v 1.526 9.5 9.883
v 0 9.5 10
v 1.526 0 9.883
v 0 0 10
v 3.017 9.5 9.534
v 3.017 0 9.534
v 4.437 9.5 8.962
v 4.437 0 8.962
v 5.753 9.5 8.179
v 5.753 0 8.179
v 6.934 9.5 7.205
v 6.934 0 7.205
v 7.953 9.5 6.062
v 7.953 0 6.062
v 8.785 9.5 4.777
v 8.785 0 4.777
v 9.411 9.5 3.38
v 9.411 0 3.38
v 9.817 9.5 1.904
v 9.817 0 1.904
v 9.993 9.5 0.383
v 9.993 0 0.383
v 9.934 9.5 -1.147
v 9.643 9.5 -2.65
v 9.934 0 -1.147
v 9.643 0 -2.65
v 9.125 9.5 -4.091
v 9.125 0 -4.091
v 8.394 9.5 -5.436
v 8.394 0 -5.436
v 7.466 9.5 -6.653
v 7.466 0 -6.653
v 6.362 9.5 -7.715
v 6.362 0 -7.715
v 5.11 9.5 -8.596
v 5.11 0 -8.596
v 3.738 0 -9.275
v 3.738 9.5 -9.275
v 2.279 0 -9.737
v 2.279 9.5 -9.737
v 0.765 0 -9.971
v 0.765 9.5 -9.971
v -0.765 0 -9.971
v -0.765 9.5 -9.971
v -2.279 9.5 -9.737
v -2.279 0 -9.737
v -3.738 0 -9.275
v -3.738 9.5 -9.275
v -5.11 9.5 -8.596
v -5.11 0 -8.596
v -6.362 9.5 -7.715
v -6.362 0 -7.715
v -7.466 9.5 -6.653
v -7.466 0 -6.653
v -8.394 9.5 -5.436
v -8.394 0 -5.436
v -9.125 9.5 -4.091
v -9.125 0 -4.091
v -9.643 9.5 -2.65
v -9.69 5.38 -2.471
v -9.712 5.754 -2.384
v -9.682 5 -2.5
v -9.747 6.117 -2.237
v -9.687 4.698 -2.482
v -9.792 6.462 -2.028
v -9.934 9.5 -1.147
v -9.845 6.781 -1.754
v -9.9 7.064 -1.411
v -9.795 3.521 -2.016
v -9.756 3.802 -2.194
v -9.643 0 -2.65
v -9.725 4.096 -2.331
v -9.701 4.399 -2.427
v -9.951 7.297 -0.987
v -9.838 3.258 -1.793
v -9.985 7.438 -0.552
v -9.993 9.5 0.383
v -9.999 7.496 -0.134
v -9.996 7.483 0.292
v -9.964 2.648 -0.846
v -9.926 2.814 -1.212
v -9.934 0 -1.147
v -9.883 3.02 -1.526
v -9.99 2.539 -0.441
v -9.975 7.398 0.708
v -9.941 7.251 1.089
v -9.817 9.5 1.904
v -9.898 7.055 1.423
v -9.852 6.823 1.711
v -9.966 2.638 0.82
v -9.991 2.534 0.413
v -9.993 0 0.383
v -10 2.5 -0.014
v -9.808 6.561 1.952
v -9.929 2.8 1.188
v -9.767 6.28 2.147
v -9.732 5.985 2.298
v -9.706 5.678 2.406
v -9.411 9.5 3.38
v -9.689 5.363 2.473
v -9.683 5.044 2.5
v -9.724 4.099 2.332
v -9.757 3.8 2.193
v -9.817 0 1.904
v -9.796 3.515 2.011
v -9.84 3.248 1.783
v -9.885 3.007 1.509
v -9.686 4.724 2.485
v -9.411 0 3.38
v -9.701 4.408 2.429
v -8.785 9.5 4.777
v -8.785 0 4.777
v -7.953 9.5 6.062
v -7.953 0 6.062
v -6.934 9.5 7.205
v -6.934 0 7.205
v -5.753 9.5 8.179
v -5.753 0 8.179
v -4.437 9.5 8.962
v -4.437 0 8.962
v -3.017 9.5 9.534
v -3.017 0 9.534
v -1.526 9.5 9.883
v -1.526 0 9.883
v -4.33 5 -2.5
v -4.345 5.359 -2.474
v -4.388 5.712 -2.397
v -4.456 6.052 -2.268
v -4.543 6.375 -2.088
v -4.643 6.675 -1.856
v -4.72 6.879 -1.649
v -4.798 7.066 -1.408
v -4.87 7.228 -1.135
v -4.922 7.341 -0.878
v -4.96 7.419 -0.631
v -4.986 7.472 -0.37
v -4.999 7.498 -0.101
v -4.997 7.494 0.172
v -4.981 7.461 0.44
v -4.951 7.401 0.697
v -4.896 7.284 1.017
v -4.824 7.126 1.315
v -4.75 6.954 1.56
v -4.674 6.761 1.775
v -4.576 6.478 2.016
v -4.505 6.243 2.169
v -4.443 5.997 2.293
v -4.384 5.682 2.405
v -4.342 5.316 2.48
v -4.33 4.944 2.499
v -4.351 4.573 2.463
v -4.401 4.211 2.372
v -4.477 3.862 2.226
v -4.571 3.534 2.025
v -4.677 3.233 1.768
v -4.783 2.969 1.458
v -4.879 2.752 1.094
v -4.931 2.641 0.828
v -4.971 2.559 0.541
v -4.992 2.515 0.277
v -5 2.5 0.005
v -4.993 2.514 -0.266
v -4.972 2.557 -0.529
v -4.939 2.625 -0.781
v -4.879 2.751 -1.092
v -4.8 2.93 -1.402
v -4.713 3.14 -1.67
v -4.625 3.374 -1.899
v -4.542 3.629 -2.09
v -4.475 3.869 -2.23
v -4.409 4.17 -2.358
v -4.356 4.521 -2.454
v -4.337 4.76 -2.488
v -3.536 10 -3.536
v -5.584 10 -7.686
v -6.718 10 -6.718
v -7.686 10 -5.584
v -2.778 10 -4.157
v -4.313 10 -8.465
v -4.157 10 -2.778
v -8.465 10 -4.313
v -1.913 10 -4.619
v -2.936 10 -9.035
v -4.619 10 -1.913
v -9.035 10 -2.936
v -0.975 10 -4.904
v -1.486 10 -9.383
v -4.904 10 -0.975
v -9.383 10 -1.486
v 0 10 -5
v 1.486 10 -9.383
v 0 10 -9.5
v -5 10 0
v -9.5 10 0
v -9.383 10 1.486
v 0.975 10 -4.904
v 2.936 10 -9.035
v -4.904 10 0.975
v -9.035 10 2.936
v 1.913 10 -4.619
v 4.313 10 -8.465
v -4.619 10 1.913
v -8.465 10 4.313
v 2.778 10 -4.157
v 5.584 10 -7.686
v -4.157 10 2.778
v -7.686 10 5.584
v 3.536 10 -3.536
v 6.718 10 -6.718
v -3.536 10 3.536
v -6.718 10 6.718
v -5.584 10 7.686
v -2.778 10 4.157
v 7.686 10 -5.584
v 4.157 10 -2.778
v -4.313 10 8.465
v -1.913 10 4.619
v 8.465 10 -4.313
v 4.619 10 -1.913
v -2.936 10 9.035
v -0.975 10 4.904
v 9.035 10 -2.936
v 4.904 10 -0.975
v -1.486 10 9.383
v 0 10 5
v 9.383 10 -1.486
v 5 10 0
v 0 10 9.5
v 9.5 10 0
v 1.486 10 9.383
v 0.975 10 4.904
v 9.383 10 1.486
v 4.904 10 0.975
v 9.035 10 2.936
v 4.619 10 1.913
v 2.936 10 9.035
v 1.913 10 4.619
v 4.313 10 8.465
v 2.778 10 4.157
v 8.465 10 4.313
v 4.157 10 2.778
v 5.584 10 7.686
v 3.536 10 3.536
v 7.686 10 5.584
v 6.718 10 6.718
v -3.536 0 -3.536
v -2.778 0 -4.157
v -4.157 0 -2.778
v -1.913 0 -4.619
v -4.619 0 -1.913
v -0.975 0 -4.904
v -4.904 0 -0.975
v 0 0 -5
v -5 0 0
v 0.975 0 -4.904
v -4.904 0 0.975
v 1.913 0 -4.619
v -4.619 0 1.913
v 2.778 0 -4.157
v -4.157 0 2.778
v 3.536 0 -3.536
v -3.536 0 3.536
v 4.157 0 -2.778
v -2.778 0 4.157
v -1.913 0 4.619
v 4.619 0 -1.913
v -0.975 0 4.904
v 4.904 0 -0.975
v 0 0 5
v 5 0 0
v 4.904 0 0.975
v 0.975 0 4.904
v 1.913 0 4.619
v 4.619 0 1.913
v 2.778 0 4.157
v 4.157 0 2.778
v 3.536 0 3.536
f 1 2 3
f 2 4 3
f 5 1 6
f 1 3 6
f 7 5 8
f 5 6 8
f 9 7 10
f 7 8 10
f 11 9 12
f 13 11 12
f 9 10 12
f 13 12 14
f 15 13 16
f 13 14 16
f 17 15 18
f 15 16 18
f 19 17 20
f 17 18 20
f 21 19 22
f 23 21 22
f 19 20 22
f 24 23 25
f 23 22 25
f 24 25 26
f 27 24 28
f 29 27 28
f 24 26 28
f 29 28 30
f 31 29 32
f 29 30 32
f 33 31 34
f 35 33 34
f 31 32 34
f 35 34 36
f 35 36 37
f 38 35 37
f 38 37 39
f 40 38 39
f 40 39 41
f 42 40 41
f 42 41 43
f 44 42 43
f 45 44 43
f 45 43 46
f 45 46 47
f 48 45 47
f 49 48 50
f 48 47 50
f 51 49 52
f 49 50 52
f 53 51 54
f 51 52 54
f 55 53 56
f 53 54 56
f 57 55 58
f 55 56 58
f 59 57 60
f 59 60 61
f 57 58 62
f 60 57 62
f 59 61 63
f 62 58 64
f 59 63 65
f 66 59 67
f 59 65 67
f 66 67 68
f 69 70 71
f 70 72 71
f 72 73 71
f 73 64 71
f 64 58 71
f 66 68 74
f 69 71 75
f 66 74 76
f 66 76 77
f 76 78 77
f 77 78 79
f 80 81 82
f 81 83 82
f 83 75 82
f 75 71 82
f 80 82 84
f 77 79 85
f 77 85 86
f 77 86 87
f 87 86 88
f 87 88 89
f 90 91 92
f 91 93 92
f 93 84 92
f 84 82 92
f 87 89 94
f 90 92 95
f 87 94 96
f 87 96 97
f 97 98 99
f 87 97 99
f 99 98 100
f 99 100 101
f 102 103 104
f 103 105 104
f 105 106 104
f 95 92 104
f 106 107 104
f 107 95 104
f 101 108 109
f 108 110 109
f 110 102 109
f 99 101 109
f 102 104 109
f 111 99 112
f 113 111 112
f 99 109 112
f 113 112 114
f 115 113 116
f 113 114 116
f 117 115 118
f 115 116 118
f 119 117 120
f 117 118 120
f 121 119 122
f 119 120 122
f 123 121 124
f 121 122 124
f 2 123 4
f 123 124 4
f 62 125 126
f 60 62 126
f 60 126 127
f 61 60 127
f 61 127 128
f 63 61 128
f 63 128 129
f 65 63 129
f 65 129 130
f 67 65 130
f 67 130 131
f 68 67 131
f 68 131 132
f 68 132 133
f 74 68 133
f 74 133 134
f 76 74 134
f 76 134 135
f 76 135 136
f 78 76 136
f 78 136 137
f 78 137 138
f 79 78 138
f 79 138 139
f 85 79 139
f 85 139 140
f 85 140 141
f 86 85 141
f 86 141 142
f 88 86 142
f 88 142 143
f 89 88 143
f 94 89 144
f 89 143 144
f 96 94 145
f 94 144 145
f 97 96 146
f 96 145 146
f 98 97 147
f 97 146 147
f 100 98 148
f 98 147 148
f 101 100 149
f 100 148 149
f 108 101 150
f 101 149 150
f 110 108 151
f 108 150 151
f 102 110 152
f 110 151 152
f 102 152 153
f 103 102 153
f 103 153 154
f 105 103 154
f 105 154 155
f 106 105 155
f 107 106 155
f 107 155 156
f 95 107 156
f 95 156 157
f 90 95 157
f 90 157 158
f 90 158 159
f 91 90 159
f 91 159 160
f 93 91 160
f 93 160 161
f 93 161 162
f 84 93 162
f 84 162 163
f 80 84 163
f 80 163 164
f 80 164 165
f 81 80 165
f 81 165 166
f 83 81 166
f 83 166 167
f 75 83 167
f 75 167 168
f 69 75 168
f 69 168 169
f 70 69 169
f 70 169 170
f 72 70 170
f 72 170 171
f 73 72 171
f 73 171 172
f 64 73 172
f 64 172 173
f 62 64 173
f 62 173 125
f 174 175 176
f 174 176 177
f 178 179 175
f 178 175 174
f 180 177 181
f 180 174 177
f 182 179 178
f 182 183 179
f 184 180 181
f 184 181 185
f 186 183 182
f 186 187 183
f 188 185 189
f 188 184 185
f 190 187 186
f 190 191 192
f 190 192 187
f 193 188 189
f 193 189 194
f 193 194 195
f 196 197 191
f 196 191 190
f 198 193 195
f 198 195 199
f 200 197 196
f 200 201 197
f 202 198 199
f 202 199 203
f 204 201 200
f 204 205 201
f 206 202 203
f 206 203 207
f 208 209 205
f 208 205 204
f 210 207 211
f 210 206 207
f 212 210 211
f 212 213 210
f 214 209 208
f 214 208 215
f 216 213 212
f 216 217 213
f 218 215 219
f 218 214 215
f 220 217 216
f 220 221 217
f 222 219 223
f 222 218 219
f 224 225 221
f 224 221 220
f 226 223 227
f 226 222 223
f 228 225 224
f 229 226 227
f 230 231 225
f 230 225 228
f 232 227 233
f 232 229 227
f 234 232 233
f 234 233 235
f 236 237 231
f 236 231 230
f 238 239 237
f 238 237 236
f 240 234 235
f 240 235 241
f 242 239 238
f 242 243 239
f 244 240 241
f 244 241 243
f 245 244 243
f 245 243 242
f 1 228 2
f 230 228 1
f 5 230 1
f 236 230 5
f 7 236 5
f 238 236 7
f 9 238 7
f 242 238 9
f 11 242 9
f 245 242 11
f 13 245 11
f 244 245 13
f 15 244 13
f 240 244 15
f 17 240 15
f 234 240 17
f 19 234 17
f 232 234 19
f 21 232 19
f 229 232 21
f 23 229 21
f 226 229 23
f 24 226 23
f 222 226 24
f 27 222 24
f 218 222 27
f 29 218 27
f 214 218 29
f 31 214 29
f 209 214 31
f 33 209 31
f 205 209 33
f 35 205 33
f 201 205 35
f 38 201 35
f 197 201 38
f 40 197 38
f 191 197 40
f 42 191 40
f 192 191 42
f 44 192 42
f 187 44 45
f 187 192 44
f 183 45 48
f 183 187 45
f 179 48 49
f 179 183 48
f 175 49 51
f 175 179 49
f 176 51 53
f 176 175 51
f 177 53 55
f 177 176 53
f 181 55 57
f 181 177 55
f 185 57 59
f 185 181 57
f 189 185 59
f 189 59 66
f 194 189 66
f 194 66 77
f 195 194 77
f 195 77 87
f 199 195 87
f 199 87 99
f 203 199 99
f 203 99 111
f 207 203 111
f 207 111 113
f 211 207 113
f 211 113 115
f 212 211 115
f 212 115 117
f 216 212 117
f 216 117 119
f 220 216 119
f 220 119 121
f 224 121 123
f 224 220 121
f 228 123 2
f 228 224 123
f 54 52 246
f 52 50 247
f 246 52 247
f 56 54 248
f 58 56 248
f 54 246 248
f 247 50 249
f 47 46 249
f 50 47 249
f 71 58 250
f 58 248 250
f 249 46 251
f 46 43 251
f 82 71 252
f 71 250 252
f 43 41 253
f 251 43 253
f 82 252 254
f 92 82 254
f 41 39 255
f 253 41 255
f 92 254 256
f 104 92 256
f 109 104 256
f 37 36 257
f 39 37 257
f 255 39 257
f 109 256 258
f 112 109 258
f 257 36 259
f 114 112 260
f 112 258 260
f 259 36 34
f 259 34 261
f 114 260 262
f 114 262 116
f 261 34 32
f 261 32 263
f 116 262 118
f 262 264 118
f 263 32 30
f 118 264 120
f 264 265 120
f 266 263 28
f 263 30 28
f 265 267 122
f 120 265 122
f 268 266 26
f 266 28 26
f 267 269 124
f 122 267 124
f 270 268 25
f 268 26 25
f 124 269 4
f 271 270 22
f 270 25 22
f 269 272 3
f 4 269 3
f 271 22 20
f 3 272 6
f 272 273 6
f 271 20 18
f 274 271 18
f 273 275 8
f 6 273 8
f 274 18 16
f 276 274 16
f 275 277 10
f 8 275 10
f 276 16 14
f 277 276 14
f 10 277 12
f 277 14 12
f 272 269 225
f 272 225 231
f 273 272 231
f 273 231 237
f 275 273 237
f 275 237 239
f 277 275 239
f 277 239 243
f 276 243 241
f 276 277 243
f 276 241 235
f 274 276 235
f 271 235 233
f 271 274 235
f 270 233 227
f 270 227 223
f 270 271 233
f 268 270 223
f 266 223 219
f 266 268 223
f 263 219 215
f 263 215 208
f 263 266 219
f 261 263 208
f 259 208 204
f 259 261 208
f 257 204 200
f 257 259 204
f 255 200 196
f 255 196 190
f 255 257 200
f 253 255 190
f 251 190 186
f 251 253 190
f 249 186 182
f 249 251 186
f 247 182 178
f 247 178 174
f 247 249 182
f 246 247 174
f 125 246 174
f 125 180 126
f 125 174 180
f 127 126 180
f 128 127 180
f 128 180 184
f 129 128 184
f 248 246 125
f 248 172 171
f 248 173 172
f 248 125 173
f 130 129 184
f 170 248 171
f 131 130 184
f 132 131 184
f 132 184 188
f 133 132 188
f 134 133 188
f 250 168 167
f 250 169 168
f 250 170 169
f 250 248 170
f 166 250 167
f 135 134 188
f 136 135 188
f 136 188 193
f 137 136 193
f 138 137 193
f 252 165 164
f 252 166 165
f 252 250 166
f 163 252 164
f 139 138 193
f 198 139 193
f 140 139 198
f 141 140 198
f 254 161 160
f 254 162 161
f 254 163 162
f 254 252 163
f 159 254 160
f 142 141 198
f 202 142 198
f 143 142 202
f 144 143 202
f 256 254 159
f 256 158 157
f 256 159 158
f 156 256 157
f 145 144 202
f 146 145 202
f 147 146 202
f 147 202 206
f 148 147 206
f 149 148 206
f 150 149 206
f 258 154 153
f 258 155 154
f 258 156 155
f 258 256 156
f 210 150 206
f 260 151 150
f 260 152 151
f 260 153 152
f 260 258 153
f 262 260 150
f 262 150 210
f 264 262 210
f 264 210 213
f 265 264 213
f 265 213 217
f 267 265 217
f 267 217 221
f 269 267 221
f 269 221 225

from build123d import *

# Parameters (mm, degrees)
SKETCH1_R               = 10
SKETCH1_R_2             = 5
BOSS_EXTRUDE1_DEPTH     = 10
CHAMFER1_SIZE           = 0.5
CUT_EXTRUDE1_REACH      = 19.321
CUT_EXTRUDE1_END_RADIUS = 10
SKETCH19_R              = 2.5


with BuildPart() as part:
    # Sketch1 → Boss-Extrude1 (new body)
    with BuildSketch(Plane(origin=(0, 0, 0), x_dir=(1, 0, 0), z_dir=(0, 1, 0))):
        with Locations(Location((0, 0, 0), (0, 0, 270))):
            Circle(SKETCH1_R)
        with Locations(Location((0, 0, 0), (0, 0, 270))):
            Circle(SKETCH1_R_2, mode=Mode.SUBTRACT)
    extrude(amount=BOSS_EXTRUDE1_DEPTH)

    # Chamfer1
    chamfer1_edges = [part.edges().sort_by_distance(p)[0] for p in [
        (0, 10, -10),
    ]]
    chamfer(chamfer1_edges, length=CHAMFER1_SIZE)

    # Cut-Extrude1: up to this cylinder (the profile starts inside it)
    cut_extrude1_end = Plane(origin=(0, 5, 0), z_dir=(0, -1, 0)) * Cylinder(CUT_EXTRUDE1_END_RADIUS, 59.642, mode=Mode.PRIVATE)
    # Sketch19 → Cut-Extrude1 (cut, up to the surface)
    with BuildSketch(Plane(origin=(0, 0, 0), x_dir=(0, 0, -1), z_dir=(1, 0, 0)), mode=Mode.PRIVATE) as cut_extrude1_sk1:
        with Locations((0, 5)):
            Circle(SKETCH19_R)
    cut_extrude1_tool1 = extrude(cut_extrude1_sk1.sketch, amount=-CUT_EXTRUDE1_REACH, mode=Mode.PRIVATE) & cut_extrude1_end
    add(cut_extrude1_tool1.solids().sort_by_distance((0, 5, 0))[0], mode=Mode.SUBTRACT)


solid = part.part
